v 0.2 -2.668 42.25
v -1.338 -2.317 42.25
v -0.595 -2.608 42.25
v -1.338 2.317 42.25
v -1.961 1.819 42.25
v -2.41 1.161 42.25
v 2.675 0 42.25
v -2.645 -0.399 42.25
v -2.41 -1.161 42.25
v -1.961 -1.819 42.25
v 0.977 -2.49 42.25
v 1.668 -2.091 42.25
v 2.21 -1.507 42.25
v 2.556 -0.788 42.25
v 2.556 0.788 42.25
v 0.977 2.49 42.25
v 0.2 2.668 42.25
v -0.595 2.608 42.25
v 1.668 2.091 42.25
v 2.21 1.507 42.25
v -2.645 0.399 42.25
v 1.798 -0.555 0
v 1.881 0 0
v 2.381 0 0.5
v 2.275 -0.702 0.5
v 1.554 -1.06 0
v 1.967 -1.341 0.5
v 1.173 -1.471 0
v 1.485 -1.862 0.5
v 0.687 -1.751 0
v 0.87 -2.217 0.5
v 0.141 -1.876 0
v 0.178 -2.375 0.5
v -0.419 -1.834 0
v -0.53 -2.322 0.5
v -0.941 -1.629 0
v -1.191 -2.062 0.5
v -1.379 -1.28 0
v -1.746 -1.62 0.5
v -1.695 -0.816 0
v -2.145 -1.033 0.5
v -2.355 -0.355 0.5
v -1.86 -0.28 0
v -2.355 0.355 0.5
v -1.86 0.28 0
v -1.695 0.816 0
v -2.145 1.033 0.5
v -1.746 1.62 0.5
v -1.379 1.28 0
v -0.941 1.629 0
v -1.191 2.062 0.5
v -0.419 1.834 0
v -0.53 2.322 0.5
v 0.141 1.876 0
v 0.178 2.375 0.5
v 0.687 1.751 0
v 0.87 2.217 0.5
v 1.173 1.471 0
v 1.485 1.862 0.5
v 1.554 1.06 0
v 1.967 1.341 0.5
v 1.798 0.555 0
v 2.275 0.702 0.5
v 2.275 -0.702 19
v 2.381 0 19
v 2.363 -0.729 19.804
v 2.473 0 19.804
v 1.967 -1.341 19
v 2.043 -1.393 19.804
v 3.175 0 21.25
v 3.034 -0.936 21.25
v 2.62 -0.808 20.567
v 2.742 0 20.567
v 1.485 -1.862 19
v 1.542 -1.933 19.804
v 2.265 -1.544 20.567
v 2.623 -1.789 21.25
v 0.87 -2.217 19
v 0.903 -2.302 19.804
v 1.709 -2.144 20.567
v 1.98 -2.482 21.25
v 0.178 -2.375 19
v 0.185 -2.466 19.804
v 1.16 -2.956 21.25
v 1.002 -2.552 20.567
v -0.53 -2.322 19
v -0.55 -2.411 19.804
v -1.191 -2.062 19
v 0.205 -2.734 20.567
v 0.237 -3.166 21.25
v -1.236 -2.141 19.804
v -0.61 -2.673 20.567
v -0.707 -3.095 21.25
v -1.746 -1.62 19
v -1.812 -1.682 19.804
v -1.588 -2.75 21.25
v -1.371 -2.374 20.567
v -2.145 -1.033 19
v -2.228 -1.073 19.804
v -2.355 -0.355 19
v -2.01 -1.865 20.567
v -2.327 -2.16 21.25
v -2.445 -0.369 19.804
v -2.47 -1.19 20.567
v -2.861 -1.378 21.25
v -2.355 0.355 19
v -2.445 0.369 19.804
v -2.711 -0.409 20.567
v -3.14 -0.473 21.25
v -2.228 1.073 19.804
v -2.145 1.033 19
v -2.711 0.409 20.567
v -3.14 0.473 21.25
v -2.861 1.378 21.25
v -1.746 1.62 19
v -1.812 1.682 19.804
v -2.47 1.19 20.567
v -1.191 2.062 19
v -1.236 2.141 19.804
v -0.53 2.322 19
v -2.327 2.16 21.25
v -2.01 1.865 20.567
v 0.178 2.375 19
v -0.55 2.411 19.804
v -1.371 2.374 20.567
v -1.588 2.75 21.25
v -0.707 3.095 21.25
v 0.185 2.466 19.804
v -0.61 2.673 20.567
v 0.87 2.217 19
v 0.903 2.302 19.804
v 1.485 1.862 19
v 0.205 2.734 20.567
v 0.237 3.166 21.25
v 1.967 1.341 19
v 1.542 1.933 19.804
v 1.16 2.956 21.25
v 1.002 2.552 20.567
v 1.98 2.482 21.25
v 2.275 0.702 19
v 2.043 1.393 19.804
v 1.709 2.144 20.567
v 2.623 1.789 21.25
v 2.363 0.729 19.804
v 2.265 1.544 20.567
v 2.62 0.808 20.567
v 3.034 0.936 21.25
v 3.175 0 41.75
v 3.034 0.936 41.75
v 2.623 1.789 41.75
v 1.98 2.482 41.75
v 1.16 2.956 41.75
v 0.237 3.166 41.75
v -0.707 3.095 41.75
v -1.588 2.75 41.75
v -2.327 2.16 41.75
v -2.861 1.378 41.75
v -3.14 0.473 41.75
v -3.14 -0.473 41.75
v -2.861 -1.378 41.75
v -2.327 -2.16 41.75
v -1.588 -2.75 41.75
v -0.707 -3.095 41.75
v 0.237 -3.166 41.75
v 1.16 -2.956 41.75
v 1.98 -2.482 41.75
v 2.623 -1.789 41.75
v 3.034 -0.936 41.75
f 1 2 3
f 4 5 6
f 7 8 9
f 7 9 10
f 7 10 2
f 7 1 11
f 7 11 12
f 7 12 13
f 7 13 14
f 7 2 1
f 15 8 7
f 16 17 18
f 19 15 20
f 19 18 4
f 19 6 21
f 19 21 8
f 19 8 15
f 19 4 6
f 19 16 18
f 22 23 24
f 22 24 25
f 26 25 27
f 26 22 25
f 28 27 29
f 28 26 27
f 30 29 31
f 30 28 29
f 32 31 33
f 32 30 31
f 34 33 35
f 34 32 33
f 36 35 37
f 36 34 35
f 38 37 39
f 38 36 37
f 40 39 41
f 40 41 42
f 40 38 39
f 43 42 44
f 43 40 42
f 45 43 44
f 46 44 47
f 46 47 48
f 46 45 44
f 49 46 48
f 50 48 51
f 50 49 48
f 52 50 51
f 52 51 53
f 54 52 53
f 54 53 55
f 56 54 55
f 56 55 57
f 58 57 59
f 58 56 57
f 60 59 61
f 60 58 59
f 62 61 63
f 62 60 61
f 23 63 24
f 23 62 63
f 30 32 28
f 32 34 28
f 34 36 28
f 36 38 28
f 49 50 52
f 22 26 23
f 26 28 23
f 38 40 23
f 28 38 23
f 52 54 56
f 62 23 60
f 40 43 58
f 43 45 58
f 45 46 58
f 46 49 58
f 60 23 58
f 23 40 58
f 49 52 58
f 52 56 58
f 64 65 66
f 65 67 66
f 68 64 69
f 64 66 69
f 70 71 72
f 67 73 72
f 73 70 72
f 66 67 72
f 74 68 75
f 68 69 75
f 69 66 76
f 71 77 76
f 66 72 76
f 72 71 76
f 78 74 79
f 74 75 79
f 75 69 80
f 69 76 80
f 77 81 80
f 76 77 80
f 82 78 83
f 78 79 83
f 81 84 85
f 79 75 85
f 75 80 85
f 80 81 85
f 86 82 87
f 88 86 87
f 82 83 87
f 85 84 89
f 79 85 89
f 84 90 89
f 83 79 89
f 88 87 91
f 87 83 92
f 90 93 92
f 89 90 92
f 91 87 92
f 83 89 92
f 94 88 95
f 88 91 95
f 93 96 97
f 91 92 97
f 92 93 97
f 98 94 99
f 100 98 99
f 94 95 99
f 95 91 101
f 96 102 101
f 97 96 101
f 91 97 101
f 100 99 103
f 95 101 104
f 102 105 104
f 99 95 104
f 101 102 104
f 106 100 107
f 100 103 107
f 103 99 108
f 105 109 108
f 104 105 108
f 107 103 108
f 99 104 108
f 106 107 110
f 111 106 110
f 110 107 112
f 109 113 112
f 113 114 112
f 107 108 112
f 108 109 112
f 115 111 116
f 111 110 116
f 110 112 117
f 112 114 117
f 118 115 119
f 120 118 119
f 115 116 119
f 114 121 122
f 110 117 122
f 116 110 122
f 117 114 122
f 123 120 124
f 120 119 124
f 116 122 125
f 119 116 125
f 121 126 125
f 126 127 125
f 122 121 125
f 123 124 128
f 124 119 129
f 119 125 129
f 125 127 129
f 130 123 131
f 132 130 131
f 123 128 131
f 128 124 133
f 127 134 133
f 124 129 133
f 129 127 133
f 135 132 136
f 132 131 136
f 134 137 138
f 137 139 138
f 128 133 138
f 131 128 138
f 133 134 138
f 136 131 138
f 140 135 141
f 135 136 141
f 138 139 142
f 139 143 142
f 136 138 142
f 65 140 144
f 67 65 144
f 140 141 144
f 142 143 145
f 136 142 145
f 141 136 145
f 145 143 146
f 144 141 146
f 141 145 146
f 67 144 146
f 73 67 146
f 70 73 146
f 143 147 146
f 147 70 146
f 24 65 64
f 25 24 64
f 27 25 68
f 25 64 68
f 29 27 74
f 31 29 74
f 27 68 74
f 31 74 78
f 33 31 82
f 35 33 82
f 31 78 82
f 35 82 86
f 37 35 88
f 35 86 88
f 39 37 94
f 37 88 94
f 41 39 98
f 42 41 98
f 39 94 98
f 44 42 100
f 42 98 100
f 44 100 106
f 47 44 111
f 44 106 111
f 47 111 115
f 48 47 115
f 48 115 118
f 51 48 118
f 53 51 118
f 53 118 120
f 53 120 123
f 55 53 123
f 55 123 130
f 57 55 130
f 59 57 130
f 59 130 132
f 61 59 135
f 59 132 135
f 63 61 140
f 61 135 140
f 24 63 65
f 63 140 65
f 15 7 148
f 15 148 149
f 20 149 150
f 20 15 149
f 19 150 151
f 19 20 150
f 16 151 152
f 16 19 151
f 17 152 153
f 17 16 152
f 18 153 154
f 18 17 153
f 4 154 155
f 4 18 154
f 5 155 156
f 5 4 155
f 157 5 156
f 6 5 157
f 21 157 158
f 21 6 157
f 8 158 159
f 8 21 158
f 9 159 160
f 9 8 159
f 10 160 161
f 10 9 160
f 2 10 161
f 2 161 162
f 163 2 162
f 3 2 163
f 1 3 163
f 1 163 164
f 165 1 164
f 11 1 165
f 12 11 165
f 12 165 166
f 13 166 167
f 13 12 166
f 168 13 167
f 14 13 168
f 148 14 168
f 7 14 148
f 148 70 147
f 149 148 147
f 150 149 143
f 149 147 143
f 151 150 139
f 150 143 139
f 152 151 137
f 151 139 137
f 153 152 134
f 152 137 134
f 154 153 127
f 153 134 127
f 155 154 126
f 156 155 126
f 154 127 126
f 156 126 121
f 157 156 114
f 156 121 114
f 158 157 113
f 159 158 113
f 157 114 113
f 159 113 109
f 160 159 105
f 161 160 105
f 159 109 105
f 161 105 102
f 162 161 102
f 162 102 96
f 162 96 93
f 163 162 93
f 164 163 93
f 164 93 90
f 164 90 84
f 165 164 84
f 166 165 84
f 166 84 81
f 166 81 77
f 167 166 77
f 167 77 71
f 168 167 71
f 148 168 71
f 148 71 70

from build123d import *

# Parameters (mm, degrees)
SKETCH2_R           = 3.175
BOSS_EXTRUDE1_DEPTH = 42.25
CHAMFER1_SIZE       = 0.5


with BuildPart() as part:
    # Sketch2 → Boss-Extrude1 (new body)
    with BuildSketch(Plane.XY):
        Circle(SKETCH2_R)
    extrude(amount=BOSS_EXTRUDE1_DEPTH)

    # Sketch5 → Cut-Revolve1 (revolve, cut)
    with BuildSketch(Plane(origin=(0, 0, 0), x_dir=(0, 0, -1), z_dir=(1, 0, 0)), mode=Mode.PRIVATE) as cut_revolve1_sk:
        with BuildLine():
            Line((-21.25, 3.175), (0, 3.175))
            Line((0, 3.175), (0, 2.38125))
            Line((0, 2.38125), (-19, 2.38125))
            ThreePointArc((-19, 2.38125), (-20.192952122, 2.585504811), (-21.25, 3.175))
        make_face()
    revolve(cut_revolve1_sk.sketch.rotate(Axis((0, 0, 21.25), (0, 0, -1)), 90), axis=Axis((0, 0, 21.25), (0, 0, -1)), mode=Mode.SUBTRACT)

    # Chamfer1
    chamfer1_edges = [part.edges().sort_by_distance(p)[0] for p in [
        (-3.175, 0, 42.25),
        (-2.38125, 0, 0),
    ]]
    chamfer(chamfer1_edges, length=CHAMFER1_SIZE)


solid = part.part
